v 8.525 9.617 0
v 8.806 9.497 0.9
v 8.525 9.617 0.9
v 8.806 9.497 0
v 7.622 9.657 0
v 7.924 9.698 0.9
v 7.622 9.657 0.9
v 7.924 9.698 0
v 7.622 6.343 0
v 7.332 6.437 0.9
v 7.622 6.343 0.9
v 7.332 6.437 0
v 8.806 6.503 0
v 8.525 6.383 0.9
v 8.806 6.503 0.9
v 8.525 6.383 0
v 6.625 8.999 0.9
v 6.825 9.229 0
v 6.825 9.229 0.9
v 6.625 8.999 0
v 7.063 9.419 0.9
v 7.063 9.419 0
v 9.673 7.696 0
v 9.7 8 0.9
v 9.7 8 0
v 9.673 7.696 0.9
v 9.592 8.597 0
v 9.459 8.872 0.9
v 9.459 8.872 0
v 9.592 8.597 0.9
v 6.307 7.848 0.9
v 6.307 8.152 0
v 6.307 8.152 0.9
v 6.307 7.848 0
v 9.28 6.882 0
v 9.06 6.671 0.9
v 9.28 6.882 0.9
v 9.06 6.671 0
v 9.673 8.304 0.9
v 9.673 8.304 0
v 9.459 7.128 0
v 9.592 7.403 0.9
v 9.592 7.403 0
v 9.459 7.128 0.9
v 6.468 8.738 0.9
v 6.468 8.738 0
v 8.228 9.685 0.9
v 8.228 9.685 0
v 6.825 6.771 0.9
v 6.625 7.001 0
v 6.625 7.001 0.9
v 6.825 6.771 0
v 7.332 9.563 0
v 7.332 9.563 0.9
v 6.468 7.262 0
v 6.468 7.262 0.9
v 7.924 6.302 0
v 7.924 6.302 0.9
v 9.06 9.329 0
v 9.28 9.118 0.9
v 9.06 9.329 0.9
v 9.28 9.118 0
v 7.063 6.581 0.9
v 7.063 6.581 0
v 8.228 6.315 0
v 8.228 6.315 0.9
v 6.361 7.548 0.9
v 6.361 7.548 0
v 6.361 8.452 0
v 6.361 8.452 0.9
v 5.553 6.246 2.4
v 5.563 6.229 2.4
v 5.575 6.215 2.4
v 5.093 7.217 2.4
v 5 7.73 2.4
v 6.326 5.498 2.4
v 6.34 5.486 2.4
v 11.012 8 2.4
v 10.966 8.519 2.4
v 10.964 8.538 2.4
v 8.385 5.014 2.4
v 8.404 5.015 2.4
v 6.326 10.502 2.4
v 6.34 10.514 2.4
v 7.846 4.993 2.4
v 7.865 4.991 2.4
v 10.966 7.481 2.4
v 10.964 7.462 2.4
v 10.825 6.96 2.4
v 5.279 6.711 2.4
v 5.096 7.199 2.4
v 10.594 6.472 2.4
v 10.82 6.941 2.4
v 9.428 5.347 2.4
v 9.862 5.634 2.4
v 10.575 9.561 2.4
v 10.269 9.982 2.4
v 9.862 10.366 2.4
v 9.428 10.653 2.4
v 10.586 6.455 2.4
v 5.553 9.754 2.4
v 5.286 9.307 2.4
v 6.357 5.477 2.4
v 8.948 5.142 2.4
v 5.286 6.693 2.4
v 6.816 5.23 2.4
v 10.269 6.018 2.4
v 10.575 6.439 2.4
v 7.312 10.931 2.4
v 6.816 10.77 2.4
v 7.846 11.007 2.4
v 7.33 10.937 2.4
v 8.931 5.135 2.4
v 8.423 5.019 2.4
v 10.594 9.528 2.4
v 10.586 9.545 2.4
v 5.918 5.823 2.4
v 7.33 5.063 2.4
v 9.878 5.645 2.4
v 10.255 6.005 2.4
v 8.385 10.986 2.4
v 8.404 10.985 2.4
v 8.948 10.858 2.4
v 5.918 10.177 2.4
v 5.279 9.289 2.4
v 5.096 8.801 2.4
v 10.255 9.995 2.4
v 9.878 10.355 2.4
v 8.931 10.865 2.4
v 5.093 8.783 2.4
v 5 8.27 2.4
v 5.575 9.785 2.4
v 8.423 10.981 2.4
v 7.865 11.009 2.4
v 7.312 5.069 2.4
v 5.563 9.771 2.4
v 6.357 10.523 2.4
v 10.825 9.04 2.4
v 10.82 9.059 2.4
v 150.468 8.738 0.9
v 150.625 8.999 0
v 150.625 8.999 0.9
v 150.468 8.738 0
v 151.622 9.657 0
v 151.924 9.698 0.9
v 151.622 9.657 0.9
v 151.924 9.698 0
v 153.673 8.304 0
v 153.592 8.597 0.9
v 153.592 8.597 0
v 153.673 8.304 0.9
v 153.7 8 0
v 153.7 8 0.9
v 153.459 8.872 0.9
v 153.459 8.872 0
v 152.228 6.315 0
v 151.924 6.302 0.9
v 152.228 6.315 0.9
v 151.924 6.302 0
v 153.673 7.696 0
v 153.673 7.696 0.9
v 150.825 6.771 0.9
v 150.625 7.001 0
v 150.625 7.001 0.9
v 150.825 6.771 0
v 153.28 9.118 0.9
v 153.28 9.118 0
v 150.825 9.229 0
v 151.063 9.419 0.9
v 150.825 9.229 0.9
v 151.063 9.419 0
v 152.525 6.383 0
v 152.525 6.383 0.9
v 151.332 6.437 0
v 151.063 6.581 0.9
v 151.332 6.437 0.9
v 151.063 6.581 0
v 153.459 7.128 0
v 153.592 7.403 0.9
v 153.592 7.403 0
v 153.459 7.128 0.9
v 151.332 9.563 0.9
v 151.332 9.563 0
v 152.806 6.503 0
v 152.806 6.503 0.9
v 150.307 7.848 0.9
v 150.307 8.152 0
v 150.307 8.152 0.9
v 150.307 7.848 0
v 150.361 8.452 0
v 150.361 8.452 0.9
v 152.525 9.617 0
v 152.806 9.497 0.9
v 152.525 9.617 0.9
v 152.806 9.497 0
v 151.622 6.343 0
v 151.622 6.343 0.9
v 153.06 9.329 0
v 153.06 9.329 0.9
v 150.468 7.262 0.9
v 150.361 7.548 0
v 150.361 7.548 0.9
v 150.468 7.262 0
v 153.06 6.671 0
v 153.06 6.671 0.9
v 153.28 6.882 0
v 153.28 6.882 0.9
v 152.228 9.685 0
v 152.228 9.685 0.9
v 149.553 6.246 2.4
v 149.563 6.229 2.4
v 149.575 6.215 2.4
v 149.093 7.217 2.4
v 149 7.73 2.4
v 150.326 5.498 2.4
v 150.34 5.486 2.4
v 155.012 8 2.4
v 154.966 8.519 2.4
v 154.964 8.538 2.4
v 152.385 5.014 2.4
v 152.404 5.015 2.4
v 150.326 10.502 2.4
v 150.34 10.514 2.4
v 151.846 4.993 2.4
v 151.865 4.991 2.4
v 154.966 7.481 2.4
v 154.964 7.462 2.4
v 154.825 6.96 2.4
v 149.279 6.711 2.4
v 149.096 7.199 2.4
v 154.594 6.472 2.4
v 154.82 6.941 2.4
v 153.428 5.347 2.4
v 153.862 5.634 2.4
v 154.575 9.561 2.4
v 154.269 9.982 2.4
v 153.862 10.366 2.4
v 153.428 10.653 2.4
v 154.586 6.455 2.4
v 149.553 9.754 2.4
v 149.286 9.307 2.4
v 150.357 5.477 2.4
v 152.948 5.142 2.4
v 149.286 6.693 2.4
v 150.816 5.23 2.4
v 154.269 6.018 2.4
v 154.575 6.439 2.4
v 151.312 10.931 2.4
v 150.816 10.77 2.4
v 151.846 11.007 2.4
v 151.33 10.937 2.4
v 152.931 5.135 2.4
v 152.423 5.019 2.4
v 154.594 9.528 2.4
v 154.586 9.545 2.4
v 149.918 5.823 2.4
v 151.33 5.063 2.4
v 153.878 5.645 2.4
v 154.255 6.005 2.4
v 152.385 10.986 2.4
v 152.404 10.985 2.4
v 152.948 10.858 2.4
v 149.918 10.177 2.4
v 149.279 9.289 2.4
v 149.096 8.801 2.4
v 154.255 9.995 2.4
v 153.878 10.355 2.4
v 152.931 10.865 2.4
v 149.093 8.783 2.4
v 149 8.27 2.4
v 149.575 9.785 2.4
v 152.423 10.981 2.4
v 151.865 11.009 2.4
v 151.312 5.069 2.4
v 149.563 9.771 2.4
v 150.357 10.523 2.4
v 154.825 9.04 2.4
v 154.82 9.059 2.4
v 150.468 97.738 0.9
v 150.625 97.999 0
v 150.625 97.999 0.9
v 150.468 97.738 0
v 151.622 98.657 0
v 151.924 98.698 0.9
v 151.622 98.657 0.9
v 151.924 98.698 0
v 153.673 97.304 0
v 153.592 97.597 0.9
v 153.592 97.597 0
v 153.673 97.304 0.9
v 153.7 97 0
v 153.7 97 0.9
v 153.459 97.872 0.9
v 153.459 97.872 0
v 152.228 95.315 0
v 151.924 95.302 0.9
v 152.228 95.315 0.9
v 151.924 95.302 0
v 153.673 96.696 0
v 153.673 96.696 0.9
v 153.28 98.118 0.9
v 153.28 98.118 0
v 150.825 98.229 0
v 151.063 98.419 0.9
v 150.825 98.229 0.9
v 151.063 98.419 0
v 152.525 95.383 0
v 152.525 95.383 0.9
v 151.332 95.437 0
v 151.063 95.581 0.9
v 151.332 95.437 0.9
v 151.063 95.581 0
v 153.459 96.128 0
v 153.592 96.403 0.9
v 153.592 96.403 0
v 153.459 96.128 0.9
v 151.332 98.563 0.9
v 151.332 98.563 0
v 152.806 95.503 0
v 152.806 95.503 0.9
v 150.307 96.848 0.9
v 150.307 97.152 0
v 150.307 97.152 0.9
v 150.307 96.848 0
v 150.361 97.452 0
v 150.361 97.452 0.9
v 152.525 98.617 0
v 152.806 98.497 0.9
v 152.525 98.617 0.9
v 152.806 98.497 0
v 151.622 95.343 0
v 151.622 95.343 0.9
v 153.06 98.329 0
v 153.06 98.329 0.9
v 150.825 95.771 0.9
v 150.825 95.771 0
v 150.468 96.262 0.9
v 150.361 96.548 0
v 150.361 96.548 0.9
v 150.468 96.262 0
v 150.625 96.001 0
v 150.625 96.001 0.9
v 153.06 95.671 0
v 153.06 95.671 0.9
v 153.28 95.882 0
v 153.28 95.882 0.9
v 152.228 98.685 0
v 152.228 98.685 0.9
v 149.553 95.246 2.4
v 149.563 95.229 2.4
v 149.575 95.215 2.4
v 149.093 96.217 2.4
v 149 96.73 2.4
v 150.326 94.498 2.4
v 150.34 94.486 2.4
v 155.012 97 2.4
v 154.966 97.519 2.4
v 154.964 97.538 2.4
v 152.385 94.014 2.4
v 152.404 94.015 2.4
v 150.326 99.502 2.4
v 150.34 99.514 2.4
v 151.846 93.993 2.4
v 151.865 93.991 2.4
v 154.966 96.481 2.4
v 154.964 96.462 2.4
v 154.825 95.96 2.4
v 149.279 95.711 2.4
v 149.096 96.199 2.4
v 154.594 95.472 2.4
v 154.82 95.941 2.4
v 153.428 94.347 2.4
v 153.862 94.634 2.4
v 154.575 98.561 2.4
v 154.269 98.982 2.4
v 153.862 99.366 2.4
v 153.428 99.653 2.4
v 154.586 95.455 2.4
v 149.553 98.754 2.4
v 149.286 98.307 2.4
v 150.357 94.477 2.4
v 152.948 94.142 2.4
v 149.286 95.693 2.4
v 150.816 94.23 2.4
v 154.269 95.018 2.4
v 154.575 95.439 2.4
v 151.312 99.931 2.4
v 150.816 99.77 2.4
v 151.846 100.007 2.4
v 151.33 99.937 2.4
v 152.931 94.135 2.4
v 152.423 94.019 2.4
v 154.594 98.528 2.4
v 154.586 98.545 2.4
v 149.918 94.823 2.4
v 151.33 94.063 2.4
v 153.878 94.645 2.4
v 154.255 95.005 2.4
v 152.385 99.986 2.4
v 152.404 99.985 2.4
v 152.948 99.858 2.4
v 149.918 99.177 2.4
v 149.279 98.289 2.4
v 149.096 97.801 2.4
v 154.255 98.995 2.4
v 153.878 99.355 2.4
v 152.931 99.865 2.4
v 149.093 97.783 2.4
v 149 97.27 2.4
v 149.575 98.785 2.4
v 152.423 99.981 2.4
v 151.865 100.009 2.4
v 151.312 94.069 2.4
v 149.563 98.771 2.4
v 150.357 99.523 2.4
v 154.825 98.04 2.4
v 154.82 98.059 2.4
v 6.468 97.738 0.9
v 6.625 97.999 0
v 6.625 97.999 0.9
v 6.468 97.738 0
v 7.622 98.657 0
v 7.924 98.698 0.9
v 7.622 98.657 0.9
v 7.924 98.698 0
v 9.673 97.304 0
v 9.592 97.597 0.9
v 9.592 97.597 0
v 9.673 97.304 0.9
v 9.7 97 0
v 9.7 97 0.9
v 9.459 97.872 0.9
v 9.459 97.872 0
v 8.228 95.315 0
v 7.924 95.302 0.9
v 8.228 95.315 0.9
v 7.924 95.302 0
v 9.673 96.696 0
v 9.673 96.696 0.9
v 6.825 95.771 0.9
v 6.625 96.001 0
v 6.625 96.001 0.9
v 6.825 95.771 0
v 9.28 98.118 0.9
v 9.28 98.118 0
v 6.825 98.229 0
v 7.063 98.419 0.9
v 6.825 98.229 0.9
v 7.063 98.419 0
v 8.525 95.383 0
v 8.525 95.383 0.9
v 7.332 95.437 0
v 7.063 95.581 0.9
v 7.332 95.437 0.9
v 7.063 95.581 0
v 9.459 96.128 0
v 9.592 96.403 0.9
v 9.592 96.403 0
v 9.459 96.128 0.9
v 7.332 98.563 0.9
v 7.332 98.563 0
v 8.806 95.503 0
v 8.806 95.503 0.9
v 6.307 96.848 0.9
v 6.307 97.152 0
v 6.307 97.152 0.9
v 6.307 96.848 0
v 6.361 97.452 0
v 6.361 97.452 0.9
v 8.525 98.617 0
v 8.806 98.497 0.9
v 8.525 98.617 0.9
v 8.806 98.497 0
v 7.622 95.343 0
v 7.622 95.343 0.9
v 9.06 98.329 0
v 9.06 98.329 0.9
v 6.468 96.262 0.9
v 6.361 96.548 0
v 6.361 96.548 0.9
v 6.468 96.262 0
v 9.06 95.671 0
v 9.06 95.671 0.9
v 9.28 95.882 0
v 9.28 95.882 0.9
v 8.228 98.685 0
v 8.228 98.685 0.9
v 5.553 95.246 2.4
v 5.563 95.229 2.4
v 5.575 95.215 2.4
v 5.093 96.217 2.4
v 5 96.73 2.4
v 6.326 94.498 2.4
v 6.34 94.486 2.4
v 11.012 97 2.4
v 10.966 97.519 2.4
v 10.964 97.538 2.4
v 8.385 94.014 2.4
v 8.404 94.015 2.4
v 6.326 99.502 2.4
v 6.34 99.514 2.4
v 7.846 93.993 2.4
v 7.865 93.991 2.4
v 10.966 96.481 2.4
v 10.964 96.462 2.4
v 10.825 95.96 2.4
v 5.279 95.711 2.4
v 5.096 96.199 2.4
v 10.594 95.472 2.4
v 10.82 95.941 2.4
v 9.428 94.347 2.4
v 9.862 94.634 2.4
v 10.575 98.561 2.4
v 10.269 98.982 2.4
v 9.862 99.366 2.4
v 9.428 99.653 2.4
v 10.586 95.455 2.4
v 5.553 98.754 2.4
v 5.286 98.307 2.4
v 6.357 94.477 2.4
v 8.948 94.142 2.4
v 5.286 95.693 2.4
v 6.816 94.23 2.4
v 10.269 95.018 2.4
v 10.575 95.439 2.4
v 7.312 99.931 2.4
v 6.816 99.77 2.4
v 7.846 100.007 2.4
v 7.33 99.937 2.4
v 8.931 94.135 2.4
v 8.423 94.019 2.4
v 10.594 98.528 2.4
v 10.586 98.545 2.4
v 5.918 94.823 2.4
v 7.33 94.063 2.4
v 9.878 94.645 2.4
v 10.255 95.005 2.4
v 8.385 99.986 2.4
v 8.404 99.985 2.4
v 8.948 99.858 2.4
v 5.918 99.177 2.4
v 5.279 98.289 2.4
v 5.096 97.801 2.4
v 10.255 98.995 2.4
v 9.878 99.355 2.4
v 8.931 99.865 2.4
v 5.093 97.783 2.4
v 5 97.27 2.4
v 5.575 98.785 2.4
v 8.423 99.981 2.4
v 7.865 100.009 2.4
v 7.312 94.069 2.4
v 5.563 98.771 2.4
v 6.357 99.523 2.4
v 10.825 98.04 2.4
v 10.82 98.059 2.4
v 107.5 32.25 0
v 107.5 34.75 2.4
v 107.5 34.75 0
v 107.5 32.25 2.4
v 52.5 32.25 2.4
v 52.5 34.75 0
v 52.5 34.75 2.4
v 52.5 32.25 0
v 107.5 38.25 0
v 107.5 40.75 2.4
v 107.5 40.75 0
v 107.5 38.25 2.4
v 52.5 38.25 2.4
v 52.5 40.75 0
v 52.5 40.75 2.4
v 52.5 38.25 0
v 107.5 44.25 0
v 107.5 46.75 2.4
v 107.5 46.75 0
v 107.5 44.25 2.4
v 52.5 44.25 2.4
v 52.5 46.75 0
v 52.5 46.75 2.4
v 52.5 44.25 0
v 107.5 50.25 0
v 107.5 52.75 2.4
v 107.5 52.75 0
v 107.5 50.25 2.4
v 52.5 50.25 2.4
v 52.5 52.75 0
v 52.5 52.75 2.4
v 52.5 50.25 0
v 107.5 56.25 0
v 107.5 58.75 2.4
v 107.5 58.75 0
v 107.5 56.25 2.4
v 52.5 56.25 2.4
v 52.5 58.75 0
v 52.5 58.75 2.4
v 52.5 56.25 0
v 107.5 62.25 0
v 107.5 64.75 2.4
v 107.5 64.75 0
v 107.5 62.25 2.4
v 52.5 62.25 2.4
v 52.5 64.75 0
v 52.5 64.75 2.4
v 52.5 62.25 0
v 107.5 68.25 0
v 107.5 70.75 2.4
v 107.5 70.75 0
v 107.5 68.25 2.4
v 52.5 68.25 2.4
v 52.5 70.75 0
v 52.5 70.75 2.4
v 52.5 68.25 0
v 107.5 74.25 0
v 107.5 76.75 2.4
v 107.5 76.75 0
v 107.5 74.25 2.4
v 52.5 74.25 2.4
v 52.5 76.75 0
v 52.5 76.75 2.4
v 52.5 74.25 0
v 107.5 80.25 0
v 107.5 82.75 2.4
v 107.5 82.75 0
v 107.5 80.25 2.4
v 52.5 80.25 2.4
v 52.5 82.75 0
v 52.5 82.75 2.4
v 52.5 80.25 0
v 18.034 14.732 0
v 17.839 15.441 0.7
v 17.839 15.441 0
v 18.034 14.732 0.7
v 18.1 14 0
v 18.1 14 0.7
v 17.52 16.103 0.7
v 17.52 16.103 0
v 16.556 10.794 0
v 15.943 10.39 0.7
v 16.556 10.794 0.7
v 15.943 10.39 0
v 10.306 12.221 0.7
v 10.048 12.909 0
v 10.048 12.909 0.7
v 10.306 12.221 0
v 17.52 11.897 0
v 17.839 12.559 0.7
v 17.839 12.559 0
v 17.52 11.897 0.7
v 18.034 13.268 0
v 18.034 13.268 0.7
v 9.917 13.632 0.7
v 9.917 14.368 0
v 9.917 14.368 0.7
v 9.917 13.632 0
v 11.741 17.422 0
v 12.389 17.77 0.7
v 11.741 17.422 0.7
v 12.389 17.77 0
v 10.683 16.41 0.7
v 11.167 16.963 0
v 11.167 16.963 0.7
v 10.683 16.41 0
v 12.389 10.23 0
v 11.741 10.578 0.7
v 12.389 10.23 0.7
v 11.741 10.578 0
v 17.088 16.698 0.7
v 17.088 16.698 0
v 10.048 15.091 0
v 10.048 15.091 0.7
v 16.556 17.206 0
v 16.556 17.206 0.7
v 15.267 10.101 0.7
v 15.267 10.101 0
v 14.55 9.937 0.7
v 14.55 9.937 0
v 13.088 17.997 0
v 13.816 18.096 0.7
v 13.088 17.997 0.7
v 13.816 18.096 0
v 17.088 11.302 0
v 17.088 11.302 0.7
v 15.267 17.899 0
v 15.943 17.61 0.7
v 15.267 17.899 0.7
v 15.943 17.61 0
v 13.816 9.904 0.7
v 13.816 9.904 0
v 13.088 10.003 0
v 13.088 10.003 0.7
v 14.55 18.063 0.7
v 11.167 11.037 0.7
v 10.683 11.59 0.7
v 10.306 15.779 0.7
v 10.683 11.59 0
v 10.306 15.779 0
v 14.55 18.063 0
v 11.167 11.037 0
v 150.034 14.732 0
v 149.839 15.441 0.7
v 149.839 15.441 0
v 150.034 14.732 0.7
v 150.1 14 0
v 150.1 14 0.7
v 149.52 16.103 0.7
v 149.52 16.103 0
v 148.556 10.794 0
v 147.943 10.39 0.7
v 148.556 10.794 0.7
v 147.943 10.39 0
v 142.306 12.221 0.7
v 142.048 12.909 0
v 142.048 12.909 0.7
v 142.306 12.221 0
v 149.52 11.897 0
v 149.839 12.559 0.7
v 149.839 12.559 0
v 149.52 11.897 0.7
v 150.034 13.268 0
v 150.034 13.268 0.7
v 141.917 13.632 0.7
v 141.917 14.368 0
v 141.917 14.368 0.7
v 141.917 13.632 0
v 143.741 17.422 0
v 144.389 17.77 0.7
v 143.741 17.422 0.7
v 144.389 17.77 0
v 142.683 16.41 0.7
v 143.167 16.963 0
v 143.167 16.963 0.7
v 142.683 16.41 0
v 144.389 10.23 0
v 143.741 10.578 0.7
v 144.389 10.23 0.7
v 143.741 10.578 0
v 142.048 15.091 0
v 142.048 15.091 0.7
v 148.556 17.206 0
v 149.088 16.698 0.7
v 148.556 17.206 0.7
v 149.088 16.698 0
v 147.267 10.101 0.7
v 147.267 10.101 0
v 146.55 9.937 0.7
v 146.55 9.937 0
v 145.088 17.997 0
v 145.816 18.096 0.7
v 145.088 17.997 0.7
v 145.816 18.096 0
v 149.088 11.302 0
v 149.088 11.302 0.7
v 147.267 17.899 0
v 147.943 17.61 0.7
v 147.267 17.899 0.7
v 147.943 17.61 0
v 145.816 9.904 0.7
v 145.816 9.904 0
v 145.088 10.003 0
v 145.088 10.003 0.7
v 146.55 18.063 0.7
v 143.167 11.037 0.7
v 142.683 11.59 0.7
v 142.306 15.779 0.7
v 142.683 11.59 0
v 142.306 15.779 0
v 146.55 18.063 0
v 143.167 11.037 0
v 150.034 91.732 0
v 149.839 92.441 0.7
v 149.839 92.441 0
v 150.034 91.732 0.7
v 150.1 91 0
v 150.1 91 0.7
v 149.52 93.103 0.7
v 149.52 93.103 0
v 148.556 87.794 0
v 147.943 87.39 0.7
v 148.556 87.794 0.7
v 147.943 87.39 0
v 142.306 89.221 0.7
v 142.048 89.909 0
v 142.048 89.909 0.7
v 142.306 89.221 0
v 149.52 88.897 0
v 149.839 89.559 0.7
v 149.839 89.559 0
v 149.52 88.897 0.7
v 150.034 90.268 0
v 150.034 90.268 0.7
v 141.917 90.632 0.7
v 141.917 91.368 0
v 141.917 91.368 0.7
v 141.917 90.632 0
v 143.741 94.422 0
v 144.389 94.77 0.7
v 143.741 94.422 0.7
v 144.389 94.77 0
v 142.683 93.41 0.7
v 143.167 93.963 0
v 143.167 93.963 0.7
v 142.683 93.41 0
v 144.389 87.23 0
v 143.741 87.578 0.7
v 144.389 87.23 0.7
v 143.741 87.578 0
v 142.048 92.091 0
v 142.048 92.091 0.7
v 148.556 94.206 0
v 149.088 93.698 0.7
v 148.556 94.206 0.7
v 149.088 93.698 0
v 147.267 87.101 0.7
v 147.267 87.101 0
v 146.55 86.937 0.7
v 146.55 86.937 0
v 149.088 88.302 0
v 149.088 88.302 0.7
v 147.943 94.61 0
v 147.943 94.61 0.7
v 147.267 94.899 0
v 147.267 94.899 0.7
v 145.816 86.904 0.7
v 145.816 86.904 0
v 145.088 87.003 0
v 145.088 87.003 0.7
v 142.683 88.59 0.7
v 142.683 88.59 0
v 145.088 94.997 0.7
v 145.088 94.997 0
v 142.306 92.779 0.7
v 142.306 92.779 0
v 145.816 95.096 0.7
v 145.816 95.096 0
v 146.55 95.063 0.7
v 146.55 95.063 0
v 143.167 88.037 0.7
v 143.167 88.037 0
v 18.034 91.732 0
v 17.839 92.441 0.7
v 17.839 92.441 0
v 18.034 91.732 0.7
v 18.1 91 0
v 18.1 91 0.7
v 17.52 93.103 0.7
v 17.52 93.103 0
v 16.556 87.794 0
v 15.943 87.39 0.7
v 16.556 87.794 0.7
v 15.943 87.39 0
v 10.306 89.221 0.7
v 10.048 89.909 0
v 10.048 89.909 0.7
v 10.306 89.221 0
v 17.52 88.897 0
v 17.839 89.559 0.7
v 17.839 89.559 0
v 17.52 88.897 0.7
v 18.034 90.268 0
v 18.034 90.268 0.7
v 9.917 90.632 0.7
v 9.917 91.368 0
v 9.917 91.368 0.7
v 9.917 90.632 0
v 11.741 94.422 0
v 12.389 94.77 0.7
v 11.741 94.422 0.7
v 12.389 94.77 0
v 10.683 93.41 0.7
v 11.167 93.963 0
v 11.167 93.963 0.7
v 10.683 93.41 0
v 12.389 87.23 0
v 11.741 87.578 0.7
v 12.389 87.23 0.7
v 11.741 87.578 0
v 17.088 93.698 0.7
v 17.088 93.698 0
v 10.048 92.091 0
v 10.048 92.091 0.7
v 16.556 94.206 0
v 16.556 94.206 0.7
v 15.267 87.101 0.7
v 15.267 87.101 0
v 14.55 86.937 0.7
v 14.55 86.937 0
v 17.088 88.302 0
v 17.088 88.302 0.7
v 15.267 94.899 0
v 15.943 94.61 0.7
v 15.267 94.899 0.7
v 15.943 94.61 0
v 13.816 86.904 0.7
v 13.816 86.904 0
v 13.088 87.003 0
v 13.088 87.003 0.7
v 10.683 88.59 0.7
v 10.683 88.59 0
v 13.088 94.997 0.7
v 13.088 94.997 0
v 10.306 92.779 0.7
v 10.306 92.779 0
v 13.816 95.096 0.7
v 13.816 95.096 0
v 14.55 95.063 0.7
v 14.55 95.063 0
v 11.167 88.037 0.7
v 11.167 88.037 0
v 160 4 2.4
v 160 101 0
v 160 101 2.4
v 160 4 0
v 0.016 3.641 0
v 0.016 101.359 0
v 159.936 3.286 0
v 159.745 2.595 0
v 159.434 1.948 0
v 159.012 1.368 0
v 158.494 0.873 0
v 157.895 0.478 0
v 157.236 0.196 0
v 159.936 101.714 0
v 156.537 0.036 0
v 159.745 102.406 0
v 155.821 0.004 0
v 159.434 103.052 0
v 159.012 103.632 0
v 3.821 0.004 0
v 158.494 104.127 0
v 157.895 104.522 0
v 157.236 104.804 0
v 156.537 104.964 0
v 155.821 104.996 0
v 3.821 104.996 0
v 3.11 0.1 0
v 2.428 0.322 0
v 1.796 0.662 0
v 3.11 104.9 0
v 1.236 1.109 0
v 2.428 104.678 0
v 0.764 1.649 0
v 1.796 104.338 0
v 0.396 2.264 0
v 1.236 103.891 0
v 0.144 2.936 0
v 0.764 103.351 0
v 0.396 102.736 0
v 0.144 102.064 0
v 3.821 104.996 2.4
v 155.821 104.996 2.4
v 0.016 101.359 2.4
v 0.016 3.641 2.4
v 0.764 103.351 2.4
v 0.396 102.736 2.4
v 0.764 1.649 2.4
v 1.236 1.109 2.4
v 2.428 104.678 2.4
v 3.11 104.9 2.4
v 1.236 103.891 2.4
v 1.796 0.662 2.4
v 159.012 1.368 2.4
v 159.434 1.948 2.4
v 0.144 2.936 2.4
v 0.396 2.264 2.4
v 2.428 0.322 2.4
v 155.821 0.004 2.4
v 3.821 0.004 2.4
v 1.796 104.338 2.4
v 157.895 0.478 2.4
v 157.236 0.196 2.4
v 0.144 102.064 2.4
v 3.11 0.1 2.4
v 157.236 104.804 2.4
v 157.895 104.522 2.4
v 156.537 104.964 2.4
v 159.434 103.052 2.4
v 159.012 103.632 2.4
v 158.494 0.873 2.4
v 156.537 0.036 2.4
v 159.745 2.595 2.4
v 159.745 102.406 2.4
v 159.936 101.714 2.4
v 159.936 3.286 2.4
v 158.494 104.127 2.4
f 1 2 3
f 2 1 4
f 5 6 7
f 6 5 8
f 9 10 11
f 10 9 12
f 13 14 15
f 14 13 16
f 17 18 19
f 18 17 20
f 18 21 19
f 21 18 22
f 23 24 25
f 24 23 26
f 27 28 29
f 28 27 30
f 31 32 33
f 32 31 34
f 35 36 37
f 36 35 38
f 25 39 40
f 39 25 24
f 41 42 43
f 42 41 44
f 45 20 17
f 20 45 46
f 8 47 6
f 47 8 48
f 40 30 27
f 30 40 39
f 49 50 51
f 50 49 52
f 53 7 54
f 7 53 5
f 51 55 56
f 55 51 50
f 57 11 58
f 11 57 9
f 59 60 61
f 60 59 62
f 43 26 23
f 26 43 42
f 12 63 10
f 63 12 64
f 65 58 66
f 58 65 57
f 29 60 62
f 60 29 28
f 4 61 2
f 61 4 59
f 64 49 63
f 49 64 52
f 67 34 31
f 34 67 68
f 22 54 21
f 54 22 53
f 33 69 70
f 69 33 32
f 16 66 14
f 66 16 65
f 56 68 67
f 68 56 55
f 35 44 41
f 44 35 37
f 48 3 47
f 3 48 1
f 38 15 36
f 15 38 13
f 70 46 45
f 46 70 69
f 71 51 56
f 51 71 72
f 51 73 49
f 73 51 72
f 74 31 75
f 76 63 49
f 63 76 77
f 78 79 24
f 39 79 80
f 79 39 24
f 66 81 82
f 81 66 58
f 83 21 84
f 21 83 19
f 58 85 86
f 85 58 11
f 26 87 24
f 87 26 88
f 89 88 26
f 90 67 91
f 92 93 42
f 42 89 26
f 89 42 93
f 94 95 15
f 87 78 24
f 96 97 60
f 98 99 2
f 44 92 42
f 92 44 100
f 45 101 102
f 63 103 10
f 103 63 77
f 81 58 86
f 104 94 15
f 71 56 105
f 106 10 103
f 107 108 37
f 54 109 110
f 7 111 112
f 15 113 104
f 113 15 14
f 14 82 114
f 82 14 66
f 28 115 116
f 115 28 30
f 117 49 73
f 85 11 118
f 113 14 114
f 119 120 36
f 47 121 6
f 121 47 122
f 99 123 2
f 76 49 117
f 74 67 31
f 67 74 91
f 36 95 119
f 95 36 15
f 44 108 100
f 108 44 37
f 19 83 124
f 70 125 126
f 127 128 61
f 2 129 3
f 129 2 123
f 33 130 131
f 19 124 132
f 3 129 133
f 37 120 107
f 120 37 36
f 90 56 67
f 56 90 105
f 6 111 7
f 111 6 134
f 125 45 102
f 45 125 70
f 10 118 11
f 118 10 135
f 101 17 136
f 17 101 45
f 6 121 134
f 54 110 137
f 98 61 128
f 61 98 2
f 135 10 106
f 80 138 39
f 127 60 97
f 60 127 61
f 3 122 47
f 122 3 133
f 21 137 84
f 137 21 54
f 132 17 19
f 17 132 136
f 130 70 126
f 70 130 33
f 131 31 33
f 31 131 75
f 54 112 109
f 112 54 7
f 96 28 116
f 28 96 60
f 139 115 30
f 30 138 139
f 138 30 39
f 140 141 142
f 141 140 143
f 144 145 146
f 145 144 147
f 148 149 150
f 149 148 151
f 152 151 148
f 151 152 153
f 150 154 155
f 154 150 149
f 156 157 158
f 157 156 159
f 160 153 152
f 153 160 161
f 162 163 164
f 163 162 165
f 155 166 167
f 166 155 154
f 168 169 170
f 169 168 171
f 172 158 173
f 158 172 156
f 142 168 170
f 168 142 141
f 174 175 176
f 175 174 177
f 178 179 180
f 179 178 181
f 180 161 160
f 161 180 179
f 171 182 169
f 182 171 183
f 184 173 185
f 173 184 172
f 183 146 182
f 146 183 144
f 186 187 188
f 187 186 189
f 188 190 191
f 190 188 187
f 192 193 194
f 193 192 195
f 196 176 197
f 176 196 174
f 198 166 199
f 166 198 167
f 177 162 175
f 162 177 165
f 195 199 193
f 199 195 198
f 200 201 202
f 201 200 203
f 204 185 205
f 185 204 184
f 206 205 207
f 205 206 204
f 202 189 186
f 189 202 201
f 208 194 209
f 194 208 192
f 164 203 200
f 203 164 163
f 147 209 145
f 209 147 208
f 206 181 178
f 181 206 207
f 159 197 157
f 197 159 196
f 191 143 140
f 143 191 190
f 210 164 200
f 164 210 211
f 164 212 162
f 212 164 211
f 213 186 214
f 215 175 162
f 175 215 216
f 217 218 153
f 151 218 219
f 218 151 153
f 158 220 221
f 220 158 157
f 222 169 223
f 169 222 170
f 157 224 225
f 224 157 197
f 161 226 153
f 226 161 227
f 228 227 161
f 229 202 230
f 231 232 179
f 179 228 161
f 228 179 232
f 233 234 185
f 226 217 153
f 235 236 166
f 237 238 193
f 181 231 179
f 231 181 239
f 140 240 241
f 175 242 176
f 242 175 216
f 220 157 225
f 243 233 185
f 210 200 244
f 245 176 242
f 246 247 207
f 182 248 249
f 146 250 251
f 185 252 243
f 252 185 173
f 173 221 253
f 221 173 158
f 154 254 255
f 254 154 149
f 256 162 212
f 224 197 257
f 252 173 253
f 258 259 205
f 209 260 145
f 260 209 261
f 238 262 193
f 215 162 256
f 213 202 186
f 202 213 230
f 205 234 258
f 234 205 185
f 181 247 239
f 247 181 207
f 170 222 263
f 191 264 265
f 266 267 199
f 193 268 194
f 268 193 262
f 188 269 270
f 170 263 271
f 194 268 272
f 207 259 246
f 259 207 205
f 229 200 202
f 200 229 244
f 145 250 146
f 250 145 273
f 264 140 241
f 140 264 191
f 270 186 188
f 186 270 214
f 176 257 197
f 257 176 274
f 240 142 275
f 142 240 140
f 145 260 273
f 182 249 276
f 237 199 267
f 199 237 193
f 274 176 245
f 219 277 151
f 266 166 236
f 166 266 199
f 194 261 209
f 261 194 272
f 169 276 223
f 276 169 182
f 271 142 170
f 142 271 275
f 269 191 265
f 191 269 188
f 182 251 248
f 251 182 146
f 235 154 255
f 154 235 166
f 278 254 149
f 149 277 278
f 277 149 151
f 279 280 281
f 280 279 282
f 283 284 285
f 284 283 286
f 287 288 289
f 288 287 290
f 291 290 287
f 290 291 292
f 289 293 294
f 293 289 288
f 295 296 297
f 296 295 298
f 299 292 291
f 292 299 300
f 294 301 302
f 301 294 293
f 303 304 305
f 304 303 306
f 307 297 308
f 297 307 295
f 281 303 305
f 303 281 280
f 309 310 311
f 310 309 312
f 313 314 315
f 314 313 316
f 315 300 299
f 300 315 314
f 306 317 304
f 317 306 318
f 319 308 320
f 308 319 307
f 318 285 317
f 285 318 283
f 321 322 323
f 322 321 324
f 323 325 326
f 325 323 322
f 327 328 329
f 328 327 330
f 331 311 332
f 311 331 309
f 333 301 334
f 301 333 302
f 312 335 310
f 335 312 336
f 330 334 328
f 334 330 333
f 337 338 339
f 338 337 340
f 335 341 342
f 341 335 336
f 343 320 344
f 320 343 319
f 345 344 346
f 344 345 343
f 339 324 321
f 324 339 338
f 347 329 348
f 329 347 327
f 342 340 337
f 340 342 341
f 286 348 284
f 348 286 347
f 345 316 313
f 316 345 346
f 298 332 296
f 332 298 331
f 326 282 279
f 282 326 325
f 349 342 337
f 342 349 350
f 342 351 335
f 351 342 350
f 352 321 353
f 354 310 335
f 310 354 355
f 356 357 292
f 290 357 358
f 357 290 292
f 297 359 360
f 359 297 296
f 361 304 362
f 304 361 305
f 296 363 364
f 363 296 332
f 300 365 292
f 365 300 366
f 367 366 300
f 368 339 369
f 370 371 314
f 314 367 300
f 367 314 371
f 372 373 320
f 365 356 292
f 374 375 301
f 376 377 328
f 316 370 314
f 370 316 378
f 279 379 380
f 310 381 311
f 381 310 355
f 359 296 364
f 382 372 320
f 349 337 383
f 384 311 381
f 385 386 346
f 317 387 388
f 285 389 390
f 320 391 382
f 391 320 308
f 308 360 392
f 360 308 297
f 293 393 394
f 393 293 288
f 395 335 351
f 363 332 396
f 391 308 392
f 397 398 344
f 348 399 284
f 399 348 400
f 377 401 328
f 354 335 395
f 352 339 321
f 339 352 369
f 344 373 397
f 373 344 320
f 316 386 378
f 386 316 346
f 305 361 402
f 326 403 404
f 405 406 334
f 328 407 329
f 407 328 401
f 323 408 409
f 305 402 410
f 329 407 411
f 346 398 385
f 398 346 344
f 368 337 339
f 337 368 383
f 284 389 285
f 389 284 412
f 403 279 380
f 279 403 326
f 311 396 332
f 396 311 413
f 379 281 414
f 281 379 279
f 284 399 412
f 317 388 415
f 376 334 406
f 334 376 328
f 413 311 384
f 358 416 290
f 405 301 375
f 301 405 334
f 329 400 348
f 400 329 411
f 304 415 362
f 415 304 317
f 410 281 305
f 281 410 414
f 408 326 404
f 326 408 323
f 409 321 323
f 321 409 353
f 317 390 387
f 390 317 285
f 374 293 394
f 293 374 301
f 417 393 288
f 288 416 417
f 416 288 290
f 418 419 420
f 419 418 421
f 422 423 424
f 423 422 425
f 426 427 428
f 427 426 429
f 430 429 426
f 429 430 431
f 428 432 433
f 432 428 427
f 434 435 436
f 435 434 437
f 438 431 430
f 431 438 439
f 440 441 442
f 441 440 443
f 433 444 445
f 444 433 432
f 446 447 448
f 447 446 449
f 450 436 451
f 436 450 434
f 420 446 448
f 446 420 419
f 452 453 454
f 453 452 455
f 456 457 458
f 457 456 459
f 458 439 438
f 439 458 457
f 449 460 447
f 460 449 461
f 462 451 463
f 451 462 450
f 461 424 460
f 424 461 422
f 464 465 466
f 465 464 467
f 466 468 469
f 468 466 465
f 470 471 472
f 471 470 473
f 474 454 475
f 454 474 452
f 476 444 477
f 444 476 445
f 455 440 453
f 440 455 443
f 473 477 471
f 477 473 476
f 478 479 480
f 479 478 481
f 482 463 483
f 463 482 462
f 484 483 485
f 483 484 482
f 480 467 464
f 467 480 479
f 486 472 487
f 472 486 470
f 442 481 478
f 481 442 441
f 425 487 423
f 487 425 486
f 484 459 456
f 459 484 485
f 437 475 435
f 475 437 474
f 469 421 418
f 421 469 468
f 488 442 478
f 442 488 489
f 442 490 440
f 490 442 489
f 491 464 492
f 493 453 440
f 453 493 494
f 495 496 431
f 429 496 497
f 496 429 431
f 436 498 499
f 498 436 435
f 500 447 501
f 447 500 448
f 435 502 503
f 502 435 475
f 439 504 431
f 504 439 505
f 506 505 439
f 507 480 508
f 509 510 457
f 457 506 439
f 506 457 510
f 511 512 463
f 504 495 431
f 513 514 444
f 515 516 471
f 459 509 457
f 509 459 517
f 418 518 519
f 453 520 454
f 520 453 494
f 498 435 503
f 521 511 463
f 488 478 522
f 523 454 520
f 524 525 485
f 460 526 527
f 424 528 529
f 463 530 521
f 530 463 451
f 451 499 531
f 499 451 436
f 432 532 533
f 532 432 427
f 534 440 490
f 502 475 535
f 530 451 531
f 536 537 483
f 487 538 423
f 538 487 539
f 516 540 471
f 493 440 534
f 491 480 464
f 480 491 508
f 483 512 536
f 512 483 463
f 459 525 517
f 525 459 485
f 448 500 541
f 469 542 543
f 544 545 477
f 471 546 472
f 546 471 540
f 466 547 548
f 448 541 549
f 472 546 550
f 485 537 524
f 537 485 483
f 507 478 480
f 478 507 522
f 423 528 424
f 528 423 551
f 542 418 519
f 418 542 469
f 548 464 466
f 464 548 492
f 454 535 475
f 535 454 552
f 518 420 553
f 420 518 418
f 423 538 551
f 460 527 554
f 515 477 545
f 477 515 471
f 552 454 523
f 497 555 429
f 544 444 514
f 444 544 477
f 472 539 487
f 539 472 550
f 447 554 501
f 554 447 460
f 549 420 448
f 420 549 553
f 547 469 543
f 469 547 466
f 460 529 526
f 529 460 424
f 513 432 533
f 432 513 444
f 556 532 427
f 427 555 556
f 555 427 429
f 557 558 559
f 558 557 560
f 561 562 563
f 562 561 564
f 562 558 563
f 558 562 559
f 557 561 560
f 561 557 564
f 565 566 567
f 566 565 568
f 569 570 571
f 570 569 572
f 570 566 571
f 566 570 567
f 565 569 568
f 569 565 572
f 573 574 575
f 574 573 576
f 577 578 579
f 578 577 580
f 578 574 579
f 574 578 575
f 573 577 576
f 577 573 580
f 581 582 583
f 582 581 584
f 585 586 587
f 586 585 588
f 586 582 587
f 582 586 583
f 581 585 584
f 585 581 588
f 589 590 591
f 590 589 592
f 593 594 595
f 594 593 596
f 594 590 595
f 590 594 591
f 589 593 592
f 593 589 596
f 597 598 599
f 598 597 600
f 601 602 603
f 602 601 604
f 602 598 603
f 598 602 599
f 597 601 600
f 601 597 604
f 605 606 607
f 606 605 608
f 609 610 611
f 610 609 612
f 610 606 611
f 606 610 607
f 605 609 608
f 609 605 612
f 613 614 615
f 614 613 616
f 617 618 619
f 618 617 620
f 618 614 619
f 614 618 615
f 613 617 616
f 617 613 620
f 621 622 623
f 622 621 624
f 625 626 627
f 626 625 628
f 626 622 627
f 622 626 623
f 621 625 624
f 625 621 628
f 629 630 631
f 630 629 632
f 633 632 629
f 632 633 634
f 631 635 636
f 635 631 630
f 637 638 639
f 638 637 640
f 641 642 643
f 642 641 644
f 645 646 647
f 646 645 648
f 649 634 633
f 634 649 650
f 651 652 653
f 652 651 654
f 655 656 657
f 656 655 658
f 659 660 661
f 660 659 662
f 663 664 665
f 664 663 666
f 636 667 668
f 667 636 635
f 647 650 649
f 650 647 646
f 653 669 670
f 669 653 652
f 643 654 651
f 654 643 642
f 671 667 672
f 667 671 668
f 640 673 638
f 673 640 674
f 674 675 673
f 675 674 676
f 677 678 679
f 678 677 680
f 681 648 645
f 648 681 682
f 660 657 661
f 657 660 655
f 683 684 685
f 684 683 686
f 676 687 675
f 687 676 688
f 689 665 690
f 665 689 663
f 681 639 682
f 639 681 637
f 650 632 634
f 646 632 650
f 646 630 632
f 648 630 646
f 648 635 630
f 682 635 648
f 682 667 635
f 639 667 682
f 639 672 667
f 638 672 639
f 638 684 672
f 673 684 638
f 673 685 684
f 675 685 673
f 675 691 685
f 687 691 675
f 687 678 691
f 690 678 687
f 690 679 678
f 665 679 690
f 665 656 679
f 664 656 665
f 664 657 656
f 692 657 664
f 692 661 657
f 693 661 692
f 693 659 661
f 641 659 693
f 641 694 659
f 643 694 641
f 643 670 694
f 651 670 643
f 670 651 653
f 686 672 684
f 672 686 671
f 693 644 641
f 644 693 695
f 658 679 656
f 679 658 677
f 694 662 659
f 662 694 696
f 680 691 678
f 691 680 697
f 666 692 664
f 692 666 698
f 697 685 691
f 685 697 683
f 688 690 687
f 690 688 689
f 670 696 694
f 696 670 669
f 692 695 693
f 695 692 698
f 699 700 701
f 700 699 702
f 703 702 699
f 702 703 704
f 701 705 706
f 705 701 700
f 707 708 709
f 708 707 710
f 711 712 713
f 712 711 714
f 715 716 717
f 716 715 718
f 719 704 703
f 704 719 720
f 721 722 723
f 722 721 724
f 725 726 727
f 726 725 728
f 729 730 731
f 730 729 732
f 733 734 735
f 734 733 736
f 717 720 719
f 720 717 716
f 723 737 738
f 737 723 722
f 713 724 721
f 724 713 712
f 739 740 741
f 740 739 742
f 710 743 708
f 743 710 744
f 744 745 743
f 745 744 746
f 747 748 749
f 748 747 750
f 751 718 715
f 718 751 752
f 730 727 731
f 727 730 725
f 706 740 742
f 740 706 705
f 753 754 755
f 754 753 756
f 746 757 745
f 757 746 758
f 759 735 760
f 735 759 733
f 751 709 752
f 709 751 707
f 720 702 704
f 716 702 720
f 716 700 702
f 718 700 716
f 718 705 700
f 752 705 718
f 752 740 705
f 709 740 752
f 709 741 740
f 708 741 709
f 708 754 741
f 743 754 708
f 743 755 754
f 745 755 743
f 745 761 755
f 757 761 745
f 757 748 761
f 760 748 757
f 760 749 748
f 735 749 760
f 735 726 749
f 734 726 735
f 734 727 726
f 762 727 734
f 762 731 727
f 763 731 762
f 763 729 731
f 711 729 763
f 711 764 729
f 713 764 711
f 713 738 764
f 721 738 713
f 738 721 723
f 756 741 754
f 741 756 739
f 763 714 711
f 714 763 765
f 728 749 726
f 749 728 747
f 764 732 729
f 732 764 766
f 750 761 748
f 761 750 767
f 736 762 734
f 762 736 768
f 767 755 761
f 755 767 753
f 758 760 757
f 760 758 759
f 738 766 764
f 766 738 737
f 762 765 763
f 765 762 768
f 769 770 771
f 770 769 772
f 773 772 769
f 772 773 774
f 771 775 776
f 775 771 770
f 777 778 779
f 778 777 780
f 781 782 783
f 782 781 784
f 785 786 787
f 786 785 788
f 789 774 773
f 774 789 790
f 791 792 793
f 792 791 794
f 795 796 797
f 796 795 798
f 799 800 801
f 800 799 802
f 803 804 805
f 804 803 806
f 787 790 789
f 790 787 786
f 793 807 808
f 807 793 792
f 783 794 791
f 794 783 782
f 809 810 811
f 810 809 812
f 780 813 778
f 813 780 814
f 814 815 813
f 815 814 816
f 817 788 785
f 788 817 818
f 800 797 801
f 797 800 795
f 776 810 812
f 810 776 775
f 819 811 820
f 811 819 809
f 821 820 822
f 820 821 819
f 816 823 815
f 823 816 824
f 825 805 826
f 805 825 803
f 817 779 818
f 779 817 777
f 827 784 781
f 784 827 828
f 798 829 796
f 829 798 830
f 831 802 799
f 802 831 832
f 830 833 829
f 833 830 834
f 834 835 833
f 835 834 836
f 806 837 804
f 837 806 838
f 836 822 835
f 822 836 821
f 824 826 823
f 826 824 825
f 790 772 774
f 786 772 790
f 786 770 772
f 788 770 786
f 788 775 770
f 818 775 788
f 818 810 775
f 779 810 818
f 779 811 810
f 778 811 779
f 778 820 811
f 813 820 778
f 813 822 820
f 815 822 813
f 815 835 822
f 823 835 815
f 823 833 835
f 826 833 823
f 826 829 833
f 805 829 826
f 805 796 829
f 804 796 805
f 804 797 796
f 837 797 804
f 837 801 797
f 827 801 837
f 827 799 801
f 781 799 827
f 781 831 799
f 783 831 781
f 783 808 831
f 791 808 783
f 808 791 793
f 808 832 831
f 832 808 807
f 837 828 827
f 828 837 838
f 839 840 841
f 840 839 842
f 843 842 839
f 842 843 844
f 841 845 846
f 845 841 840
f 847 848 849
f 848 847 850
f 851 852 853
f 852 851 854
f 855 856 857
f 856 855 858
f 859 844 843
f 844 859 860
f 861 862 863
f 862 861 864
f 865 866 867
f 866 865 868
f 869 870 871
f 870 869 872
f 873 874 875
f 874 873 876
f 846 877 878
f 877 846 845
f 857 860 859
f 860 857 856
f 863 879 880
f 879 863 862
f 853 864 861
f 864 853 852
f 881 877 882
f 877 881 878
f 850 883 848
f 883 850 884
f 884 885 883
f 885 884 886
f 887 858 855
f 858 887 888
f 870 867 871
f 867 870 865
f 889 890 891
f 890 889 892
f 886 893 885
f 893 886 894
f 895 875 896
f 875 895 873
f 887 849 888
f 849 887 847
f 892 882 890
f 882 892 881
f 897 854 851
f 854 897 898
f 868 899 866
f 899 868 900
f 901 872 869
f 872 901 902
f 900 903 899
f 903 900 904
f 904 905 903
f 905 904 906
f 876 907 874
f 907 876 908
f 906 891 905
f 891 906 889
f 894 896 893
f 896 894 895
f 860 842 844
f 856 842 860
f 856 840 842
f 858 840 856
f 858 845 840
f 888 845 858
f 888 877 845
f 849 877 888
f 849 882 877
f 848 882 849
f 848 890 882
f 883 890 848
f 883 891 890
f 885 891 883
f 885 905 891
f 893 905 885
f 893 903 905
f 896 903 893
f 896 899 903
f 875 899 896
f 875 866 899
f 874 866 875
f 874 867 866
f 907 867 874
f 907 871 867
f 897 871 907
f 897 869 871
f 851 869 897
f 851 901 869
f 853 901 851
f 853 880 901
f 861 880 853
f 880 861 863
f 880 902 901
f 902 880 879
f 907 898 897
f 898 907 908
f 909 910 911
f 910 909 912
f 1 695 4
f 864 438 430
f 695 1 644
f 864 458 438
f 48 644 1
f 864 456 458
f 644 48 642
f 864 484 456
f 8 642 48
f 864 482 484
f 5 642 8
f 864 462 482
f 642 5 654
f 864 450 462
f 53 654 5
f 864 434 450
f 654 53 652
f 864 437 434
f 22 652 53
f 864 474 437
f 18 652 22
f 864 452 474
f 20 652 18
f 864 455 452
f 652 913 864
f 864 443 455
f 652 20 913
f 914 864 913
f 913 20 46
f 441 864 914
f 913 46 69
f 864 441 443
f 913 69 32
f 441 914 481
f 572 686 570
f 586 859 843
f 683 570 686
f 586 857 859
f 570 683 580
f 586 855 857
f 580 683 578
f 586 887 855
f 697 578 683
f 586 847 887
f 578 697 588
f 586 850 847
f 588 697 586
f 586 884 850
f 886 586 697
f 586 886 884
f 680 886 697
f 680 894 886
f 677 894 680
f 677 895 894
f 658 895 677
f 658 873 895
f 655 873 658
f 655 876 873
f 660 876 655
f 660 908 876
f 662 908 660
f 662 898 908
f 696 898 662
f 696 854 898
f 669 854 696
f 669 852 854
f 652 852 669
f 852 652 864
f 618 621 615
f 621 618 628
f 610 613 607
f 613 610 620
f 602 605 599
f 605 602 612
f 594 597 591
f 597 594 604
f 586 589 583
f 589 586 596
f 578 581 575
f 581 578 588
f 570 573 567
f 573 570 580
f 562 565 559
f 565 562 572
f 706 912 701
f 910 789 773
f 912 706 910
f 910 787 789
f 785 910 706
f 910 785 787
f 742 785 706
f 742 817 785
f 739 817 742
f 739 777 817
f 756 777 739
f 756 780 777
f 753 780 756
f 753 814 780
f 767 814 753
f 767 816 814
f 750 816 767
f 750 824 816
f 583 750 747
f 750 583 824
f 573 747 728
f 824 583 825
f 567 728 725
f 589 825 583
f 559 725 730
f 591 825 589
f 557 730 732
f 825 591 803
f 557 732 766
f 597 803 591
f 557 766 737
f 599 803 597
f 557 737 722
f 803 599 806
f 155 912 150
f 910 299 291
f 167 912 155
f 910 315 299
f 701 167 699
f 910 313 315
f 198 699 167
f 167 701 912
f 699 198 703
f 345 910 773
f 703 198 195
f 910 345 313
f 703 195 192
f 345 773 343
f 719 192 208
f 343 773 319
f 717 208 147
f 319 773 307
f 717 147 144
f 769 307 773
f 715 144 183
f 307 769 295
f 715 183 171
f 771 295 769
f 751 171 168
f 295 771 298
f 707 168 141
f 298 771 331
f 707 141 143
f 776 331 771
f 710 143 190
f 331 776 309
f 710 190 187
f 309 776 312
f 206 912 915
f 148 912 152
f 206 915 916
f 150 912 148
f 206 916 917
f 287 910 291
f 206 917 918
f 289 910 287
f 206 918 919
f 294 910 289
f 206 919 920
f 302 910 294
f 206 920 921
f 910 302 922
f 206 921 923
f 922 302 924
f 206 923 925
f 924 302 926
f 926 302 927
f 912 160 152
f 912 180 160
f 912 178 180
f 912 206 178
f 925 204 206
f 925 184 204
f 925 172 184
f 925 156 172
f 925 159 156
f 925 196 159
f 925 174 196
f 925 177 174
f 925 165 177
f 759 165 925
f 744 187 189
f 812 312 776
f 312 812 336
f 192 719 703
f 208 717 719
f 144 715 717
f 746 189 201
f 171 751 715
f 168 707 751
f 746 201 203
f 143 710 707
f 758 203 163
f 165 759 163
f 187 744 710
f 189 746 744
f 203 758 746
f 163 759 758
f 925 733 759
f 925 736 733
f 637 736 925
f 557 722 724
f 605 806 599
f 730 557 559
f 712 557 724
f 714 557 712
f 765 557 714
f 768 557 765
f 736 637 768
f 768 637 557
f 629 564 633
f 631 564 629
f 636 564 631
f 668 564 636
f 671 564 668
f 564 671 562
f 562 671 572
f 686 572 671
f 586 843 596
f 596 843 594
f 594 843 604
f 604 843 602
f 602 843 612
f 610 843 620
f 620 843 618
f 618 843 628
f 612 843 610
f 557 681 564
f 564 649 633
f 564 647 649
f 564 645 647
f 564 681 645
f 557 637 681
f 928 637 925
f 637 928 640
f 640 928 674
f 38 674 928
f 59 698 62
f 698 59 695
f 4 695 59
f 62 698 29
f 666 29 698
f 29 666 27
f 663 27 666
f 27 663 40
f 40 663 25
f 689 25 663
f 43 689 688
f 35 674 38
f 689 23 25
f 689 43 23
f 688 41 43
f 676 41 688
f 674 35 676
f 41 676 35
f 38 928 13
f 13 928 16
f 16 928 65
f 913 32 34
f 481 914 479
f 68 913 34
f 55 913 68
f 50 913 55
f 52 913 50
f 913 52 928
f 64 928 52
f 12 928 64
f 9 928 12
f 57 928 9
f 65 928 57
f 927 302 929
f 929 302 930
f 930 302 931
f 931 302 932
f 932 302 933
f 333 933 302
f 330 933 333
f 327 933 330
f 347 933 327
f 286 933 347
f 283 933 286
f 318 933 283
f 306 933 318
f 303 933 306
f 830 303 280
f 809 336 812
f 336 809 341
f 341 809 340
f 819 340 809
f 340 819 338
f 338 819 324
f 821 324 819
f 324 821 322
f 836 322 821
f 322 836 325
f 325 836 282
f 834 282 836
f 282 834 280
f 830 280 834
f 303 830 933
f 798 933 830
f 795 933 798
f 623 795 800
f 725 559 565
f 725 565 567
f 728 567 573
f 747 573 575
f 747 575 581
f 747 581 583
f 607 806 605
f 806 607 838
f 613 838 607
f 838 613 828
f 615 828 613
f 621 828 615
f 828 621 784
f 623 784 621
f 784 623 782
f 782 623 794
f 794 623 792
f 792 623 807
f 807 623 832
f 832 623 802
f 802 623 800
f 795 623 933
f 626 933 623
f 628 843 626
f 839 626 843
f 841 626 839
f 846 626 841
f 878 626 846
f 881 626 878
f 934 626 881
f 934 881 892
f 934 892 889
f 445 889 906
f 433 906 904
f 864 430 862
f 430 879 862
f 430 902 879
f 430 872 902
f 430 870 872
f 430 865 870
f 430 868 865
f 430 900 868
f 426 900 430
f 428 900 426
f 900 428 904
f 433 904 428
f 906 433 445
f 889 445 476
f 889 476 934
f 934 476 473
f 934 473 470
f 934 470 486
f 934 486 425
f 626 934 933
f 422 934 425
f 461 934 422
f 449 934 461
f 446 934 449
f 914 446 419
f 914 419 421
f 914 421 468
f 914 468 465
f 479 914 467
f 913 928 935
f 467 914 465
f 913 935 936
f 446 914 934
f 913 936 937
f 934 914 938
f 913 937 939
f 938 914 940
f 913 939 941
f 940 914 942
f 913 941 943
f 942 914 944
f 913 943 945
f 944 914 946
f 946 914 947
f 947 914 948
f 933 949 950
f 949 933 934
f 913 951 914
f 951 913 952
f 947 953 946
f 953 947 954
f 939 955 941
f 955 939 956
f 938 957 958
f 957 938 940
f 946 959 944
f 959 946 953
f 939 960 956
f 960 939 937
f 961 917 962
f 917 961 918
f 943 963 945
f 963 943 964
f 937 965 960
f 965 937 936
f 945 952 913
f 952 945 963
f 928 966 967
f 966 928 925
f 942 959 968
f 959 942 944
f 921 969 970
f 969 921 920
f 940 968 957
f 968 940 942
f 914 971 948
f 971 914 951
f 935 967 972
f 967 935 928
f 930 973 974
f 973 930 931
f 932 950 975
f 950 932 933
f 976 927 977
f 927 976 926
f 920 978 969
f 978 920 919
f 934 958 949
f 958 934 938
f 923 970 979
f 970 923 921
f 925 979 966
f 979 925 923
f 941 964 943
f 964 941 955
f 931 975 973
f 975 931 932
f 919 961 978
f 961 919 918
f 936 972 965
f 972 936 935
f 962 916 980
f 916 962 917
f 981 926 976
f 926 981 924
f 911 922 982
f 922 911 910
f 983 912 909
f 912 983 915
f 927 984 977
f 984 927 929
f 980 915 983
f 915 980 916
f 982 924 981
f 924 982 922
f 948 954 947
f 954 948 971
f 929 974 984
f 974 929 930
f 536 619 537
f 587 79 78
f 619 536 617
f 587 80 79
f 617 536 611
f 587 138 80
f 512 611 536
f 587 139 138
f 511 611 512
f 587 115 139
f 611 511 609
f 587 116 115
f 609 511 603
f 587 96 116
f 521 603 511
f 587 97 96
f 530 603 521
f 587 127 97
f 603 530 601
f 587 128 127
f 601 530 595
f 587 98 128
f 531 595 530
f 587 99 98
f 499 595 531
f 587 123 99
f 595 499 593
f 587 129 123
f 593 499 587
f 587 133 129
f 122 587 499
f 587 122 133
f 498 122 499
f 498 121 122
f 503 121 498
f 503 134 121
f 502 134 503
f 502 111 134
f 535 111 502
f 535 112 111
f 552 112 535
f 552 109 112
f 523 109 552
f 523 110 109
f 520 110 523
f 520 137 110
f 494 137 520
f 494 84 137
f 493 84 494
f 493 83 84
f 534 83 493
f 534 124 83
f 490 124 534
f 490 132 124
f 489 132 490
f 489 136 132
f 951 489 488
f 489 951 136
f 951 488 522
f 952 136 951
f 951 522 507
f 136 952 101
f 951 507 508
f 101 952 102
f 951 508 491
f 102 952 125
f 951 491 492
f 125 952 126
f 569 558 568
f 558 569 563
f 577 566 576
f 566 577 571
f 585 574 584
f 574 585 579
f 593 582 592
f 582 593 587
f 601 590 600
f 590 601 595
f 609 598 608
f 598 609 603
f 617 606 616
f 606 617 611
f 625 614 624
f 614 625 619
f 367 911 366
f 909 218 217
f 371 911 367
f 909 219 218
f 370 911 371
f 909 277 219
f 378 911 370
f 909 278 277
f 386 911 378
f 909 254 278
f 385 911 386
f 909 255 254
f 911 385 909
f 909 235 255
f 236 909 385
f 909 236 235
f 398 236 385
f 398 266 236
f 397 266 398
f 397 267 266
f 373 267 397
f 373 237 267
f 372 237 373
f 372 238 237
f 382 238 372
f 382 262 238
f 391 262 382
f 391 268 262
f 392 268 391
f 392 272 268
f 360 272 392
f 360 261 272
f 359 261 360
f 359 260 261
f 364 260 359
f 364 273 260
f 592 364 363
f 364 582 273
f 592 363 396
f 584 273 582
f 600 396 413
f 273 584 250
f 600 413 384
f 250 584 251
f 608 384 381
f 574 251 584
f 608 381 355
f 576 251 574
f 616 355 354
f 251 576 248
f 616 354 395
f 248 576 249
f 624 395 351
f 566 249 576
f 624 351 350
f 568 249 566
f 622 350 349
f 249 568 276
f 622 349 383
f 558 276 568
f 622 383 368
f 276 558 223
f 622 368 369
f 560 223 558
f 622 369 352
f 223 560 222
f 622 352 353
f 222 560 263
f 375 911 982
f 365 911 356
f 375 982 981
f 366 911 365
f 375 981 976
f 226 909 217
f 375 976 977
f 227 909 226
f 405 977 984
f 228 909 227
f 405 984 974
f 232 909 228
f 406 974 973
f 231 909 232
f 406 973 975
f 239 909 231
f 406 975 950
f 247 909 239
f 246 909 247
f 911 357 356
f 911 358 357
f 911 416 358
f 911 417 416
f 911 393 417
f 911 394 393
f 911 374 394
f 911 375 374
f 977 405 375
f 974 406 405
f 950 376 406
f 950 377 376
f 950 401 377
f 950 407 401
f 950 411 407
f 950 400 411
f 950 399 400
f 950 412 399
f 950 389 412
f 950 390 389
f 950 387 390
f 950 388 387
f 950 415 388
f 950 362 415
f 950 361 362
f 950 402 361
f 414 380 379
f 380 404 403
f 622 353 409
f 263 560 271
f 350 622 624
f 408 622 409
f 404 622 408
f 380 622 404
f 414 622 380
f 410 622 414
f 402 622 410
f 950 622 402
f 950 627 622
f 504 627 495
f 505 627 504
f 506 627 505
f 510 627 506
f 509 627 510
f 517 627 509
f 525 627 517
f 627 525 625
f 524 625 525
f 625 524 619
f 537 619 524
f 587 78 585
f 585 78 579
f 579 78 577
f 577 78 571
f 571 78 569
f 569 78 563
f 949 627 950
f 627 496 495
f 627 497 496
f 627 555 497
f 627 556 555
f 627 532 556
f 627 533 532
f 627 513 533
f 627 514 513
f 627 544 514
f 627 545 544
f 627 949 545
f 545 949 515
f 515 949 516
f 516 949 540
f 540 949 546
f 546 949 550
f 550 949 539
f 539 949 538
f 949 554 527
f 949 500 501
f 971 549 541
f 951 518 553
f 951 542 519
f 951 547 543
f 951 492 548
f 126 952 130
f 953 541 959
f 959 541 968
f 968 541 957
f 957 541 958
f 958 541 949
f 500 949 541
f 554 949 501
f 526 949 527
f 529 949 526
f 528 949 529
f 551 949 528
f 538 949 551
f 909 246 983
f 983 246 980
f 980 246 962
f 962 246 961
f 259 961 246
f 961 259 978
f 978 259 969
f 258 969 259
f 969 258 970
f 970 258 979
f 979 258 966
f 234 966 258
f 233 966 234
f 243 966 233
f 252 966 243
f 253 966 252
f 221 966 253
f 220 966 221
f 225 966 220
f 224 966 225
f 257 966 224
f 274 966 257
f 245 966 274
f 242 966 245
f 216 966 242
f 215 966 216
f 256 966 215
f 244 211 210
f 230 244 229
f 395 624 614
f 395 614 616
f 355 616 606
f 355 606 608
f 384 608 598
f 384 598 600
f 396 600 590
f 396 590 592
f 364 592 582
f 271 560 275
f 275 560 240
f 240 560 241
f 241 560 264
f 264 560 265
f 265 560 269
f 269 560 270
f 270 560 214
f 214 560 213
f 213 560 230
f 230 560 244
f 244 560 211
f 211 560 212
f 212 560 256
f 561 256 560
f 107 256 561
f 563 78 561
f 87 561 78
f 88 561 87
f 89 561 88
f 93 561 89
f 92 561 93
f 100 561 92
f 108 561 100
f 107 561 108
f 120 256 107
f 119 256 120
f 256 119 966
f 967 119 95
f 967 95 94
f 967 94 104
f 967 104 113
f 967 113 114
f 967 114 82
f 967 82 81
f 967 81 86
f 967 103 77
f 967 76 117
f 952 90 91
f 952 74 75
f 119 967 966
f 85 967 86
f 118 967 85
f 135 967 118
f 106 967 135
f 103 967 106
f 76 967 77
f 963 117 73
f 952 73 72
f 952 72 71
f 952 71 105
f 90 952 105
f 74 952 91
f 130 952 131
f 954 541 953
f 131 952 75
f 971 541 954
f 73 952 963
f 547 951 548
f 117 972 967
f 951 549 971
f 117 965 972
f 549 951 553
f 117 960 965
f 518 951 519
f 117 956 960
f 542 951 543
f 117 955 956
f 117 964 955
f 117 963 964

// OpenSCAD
// =============================================================================
// J.A.R.V.I.S. - TAMPA INFERIOR / BASE DO CONSOLE SATÉLITE (160 x 105 mm)
// =============================================================================
// Fechamento da base com furos M3, ventilação do ESP32-S3 e pés de silicone
// =============================================================================

$fn = 35;

satelite_w = 160.0;
satelite_d = 105.0;
espessura_tampa = 2.4;

difference() {
    // Placa base com cantos arredondados
    hull() {
        translate([4, 4, 0]) cylinder(r=4, h=espessura_tampa);
        translate([satelite_w - 4, 4, 0]) cylinder(r=4, h=espessura_tampa);
        translate([satelite_w - 4, satelite_d - 4, 0]) cylinder(r=4, h=espessura_tampa);
        translate([4, satelite_d - 4, 0]) cylinder(r=4, h=espessura_tampa);
    }

    // 4 Furos escareados para parafusos M3 nos cantos
    for (pos = [[8, 8], [satelite_w - 8, 8], [satelite_w - 8, satelite_d - 8], [8, satelite_d - 8]]) {
        translate([pos[0], pos[1], -0.5]) {
            cylinder(d=3.4, h=espessura_tampa + 1);
            translate([0, 0, espessura_tampa - 1.0])
                cylinder(d1=3.4, d2=6.2, h=1.6);
        }
    }

    // Grelha de ventilação central (Fluxo térmico do ESP32-S3)
    translate([satelite_w/2, satelite_d/2 + 5, 0]) {
        for (i = [-4 : 4]) {
            translate([0, i * 6, espessura_tampa/2])
                cube([55, 2.5, espessura_tampa + 1], center=true);
        }
    }

    // Rebaixos circulares para pés de borracha/silicone (Ø 8mm)
    for (pe = [[14, 14], [satelite_w - 14, 14], [satelite_w - 14, satelite_d - 14], [14, satelite_d - 14]]) {
        translate([pe[0], pe[1], -0.1])
            cylinder(d=8.2, h=0.8);
    }
}
